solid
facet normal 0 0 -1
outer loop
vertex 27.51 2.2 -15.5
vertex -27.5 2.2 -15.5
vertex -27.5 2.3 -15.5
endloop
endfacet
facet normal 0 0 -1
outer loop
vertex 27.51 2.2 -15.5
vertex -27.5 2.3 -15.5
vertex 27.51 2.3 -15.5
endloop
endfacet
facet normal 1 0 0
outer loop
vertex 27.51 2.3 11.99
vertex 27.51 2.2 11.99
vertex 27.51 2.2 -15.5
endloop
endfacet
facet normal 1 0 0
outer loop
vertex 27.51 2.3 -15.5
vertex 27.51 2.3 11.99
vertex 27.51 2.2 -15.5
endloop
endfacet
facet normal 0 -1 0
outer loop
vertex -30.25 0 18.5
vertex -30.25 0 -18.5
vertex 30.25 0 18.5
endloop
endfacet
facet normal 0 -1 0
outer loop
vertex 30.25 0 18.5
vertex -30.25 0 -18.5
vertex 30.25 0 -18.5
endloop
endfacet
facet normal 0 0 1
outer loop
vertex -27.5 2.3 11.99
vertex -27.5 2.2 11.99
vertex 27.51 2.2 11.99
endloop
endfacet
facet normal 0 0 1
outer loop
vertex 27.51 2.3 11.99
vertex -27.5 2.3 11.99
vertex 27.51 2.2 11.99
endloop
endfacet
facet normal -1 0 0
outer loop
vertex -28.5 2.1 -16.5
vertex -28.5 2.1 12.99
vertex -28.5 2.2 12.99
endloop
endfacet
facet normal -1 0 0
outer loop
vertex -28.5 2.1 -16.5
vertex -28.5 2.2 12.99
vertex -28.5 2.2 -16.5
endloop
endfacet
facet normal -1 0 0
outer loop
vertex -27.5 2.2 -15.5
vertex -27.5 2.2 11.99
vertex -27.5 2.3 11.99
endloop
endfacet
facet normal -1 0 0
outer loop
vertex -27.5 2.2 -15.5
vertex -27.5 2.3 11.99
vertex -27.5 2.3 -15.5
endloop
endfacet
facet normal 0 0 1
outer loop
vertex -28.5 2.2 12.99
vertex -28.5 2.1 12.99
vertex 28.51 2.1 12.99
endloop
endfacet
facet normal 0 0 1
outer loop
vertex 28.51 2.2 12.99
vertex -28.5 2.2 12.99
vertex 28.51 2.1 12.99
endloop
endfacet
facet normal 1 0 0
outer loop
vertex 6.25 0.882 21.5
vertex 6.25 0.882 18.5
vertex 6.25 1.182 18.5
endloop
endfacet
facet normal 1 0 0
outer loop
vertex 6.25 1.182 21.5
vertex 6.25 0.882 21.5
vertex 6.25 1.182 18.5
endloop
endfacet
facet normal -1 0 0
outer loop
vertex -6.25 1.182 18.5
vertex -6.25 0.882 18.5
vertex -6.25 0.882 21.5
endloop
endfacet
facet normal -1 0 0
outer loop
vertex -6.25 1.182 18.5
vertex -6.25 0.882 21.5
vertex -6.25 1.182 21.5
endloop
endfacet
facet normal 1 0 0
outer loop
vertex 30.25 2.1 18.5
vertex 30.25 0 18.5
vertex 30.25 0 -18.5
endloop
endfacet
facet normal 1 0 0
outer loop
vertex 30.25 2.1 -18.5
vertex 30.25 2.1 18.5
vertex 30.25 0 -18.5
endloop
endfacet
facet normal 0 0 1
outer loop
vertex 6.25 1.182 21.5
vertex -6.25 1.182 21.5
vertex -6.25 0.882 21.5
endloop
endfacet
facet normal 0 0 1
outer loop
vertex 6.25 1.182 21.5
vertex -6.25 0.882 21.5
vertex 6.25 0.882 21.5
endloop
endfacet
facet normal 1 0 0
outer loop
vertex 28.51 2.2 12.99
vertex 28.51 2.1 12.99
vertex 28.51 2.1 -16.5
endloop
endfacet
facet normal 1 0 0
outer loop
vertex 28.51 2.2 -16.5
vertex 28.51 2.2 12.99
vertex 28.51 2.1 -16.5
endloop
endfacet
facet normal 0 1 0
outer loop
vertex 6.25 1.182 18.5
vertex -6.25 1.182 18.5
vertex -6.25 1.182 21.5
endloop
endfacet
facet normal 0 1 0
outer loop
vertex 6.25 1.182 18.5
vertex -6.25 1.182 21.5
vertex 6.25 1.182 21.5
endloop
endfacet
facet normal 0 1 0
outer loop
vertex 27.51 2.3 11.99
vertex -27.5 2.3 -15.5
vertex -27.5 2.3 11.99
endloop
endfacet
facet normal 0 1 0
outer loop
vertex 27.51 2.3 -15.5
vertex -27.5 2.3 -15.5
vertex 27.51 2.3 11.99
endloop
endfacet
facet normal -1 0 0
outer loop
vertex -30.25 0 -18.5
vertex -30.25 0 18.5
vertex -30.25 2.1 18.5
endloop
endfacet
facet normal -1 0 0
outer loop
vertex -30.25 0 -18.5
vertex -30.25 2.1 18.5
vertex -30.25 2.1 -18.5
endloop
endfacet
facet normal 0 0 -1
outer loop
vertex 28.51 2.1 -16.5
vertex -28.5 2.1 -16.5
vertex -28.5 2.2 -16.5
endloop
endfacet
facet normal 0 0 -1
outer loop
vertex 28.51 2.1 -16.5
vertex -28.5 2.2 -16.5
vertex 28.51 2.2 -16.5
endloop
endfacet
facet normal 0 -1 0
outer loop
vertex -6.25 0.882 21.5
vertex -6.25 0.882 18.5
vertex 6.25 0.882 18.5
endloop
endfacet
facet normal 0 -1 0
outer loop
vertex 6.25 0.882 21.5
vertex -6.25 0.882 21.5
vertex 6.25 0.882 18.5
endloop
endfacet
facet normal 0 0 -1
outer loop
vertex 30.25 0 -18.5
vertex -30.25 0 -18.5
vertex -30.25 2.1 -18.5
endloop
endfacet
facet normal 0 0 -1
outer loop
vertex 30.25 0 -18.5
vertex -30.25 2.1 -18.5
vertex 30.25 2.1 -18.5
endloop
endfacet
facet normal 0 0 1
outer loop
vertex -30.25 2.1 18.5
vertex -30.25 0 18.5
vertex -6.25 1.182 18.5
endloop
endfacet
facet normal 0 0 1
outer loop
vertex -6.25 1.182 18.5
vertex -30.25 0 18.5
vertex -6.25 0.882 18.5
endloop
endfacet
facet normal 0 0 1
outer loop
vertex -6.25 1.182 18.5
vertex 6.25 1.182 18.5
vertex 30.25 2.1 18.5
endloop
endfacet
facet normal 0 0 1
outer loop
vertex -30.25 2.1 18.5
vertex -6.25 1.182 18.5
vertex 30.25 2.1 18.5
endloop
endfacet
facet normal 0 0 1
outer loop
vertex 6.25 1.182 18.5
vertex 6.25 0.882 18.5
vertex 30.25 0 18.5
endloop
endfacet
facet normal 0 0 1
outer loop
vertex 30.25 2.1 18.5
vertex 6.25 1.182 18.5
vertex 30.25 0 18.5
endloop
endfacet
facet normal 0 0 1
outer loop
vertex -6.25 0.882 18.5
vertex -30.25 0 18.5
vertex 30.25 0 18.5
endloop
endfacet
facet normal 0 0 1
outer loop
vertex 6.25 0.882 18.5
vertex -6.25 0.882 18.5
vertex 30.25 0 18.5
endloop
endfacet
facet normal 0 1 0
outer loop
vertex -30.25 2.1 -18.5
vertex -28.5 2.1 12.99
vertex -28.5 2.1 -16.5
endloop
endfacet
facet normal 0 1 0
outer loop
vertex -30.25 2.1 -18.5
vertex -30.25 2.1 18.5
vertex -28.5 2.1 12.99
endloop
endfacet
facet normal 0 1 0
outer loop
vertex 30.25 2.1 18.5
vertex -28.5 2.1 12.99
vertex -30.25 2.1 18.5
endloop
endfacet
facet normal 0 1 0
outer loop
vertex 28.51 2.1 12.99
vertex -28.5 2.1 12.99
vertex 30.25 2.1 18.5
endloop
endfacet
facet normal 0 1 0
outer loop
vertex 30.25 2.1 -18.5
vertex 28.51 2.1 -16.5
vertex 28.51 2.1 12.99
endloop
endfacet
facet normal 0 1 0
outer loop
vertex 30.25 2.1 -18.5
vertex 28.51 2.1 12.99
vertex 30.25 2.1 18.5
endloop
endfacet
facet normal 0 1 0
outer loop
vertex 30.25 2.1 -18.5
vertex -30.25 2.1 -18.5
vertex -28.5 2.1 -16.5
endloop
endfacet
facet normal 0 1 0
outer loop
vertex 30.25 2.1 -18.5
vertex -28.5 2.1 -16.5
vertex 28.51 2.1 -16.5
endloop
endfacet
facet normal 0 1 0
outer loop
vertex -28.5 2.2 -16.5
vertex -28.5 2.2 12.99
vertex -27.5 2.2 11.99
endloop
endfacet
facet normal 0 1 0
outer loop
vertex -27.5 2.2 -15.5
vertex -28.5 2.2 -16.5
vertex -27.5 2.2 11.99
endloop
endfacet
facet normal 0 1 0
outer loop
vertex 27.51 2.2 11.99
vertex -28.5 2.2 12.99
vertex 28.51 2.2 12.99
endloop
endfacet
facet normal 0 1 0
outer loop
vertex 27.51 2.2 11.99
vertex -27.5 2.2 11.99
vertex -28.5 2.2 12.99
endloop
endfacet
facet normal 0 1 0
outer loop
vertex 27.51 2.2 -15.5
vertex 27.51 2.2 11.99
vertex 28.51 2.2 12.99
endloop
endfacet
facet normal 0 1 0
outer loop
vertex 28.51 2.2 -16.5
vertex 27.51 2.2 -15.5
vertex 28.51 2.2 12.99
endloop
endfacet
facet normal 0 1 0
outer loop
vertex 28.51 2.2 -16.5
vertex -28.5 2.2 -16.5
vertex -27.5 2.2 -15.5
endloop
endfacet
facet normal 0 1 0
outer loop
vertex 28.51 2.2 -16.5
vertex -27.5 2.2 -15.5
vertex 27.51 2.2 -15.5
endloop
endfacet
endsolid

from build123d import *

# Parameters (mm, degrees)
SKETCH_1_W      = 60.5
SKETCH_1_H      = 37
EXTRUDE_1_DEPTH = 2.1
SKETCH_2_W      = 57.01
SKETCH_2_H      = 29.49
EXTRUDE_2_DEPTH = 0.1
SKETCH_5_W      = 55.01
SKETCH_5_H      = 27.49
EXTRUDE_4_DEPTH = 0.1
SKETCH_3_W      = 12.5
SKETCH_3_H      = 0.3
EXTRUDE_3_DEPTH = 3


with BuildPart() as part:
    # 草图1 → 凸台-拉伸1 (new body)
    with BuildSketch(Plane(origin=(0, 0, 0), x_dir=(1, 0, 0), z_dir=(0, 1, 0))):
        Rectangle(SKETCH_1_W, SKETCH_1_H)
    extrude(amount=EXTRUDE_1_DEPTH)

    # 草图2 → 凸台-拉伸2 (add)
    with BuildSketch(Plane(origin=(0, 2.1, 0), x_dir=(1, 0, 0), z_dir=(0, 1, 0))):
        with Locations((0.005, 1.755)):
            Rectangle(SKETCH_2_W, SKETCH_2_H)
    extrude(amount=EXTRUDE_2_DEPTH)

    # 草图5 → 凸台-拉伸4 (add)
    with BuildSketch(Plane(origin=(0, 2.2, 0), x_dir=(1, 0, 0), z_dir=(0, 1, 0))):
        with Locations((0.005, 1.755)):
            Rectangle(SKETCH_5_W, SKETCH_5_H)
    extrude(amount=EXTRUDE_4_DEPTH)

    # 草图3 → 凸台-拉伸3 (add)
    with BuildSketch(Plane.XY.offset(18.5)):
        with Locations((0, 1.031860601)):
            Rectangle(SKETCH_3_W, SKETCH_3_H)
    extrude(amount=EXTRUDE_3_DEPTH)


solid = part.part
